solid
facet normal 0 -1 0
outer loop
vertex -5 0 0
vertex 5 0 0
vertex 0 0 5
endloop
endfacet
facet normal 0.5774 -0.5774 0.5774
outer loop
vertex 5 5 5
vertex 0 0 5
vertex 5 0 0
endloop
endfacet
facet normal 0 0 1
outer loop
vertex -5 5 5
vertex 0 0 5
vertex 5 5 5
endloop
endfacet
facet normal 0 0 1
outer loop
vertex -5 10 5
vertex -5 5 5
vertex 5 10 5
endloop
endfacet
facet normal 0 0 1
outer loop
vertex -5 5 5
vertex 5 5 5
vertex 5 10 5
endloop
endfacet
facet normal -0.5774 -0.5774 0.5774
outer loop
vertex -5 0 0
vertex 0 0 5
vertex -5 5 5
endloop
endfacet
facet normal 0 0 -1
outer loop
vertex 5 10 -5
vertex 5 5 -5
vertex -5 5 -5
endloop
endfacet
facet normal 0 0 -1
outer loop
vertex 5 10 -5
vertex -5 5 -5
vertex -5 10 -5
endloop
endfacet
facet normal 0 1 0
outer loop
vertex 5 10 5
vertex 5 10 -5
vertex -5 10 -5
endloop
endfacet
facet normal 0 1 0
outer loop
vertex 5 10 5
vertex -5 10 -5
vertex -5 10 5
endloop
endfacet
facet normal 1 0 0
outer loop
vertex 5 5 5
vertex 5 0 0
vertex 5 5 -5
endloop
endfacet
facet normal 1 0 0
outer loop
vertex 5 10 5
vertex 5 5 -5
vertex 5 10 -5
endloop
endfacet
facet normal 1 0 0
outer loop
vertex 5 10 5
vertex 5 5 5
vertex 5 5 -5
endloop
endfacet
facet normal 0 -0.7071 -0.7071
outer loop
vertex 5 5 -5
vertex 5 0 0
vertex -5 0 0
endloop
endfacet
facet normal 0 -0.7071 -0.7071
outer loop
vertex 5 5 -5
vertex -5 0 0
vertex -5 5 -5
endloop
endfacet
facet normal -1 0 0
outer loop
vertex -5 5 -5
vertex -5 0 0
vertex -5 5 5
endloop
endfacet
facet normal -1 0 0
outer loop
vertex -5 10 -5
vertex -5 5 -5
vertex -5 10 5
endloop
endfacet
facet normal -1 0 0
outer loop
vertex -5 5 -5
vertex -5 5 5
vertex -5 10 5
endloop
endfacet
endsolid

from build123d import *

# Parameters (mm, degrees)
F0_W     = 10
F0_H     = 5
F1_DEPTH = 5
F6_DEPTH = 2.8877513459


# Not quite as in the source:
# - a pattern or mirror of a feature is missing from the dataset's text; its kind, count and spacing are read off the source's solid


with BuildPart() as f1:
    # F0 (on Right) → F1 (new body, symmetric)
    with BuildSketch(Plane.YZ):
        with Locations((5, 2.5)):
            Rectangle(F0_W, F0_H)
        Polygon((10, 0), (0, 0), (5, -5), (10, -5), align=None)
    extrude(amount=F1_DEPTH, both=True)

    # F5 (on 3pt) → F6 (cut, through all)
    with BuildSketch(Plane(origin=(1.6666666667, -1.6666666667, 1.6666666667), x_dir=(0.8164965809, 0.4082482905, -0.4082482905), z_dir=(-0.5773502692, 0.5773502692, -0.5773502692))):
        Polygon((4.0824829046, 0), (-2.0412414523, -3.5355339059), (4.0824829046, -7.0710678119), align=None)
    f6 = extrude(amount=-F6_DEPTH, mode=Mode.SUBTRACT)

    # F6_copies: F6 across plane
    add(f6.mirror(Plane(origin=(0, 0, 0), x_dir=(0, 0, -1), z_dir=(-1, 0, 0))), mode=Mode.SUBTRACT)


solid = f1.part
